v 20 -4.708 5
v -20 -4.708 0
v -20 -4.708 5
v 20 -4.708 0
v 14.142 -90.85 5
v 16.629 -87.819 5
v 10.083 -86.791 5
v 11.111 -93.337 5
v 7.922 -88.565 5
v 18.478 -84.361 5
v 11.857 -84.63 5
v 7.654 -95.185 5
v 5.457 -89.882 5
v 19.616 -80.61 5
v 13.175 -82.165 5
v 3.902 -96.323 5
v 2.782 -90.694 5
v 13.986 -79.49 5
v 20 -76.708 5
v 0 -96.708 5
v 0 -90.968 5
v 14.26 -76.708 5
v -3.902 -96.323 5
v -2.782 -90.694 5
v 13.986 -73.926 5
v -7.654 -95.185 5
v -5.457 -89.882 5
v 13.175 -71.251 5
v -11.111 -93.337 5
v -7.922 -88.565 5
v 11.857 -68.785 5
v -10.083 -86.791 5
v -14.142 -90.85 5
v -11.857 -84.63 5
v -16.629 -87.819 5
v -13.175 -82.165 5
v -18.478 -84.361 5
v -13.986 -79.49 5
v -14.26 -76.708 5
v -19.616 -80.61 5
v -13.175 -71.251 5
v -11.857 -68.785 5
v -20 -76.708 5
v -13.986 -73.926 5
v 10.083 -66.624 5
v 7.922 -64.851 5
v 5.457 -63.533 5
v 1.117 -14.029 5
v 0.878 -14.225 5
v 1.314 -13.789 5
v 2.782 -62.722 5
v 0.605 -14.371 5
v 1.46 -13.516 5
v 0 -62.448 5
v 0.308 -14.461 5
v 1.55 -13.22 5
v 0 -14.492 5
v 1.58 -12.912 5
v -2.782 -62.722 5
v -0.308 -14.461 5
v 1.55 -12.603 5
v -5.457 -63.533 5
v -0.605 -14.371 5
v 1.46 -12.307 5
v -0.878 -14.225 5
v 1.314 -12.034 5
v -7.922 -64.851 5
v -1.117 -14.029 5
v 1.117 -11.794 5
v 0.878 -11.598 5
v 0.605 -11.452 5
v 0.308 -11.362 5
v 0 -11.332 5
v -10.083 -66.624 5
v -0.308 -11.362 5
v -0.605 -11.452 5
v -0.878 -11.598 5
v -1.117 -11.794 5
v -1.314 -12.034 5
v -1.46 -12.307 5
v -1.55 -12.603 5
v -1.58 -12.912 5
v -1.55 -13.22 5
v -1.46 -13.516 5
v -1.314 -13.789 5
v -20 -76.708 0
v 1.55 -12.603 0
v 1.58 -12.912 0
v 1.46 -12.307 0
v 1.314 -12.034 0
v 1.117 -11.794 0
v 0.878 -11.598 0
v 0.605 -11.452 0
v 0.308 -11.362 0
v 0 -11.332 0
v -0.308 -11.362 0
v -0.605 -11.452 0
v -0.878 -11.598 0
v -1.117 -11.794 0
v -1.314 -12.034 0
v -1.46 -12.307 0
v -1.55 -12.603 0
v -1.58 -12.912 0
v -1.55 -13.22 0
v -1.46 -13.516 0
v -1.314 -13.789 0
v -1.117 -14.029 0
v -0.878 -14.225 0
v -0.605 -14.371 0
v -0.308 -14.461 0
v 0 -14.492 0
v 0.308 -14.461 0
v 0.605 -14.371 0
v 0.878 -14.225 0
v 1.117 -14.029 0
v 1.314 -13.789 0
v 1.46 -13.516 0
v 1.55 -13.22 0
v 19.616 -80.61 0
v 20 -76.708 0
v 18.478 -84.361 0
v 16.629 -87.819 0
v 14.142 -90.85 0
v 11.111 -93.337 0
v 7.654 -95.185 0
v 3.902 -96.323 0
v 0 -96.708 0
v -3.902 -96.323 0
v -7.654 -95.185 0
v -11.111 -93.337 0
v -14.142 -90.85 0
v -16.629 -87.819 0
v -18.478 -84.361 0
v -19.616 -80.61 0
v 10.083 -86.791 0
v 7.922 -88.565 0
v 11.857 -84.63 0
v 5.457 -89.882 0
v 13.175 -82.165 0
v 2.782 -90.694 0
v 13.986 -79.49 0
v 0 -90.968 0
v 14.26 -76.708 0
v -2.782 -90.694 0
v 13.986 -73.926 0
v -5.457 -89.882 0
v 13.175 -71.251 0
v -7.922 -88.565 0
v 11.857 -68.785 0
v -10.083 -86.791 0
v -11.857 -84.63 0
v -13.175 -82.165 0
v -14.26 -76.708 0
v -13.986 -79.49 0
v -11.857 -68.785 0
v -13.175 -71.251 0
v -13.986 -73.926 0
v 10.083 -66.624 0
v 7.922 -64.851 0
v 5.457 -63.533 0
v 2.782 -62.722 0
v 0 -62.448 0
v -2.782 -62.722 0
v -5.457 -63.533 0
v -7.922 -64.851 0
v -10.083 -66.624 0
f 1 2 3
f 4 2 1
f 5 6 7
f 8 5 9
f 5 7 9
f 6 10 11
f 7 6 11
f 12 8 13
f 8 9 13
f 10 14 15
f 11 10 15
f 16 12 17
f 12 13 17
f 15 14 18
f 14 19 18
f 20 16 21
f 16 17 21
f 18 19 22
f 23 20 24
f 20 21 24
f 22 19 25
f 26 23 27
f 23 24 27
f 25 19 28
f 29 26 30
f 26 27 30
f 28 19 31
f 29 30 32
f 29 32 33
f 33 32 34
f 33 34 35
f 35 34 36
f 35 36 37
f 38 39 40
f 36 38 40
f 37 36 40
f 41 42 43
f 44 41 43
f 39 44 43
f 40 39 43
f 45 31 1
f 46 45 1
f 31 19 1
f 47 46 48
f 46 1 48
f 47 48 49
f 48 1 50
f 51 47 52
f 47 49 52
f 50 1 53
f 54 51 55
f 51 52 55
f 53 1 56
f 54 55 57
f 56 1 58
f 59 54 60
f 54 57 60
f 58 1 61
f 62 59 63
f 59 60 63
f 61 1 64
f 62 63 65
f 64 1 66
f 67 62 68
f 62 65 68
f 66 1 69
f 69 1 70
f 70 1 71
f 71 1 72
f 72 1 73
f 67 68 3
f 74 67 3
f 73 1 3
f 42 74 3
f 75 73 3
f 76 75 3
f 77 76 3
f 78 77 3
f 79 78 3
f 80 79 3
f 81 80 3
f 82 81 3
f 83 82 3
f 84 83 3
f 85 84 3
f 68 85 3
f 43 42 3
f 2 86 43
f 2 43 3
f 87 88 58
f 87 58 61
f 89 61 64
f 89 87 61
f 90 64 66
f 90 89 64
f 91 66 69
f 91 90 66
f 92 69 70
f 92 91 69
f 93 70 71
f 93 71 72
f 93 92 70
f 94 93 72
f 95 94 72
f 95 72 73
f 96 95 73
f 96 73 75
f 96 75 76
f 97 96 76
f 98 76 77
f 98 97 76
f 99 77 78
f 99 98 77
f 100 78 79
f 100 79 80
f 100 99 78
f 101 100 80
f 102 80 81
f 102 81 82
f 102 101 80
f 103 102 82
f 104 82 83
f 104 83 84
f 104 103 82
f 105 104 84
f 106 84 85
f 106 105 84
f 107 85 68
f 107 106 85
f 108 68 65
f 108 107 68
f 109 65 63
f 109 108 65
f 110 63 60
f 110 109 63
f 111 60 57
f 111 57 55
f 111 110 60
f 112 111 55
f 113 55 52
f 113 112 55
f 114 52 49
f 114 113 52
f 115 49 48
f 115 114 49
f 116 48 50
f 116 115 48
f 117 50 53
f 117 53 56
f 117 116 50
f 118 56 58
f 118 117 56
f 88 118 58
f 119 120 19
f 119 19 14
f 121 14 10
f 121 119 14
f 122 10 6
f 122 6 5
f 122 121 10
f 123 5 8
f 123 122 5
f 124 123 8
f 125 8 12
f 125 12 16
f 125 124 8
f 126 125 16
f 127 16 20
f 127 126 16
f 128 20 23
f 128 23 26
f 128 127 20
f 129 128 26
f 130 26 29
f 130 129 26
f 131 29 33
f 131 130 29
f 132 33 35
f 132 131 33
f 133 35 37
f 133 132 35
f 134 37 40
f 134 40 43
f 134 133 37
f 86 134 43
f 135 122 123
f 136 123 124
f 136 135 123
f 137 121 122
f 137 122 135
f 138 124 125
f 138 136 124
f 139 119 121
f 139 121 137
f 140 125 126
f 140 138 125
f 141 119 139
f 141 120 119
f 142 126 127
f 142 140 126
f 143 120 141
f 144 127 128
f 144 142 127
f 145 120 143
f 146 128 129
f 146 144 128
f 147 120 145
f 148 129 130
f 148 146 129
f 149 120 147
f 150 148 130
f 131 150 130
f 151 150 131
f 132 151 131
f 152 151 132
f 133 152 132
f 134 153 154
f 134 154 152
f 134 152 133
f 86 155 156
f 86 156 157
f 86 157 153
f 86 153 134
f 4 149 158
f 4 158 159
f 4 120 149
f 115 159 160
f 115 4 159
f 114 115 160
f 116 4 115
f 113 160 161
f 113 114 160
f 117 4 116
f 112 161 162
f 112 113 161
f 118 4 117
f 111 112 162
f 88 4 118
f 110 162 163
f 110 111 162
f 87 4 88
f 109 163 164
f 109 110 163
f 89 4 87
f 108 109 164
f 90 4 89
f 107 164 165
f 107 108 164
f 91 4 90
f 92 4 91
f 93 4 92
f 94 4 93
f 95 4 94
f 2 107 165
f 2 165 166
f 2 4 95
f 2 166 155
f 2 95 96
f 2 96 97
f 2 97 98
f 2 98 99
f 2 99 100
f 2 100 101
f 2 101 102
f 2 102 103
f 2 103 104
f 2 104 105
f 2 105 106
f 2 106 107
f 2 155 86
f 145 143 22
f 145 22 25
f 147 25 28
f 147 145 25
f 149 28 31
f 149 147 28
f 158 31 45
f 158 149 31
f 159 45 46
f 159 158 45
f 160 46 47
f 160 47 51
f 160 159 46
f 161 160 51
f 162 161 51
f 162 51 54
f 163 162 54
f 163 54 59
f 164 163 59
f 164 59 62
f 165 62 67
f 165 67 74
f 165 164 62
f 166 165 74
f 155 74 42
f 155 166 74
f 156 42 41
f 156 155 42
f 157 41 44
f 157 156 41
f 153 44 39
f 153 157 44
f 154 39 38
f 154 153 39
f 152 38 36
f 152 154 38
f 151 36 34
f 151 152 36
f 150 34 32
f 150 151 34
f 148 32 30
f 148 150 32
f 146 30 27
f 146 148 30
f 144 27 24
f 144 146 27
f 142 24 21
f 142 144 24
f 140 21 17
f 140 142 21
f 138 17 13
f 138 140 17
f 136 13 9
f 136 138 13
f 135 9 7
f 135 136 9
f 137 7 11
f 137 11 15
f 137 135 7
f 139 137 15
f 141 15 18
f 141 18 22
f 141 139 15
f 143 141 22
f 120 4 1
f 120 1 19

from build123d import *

# Parameters (mm, degrees)
SKETCH1_R           = 1.58
SKETCH1_R_2         = 14.26
BOSS_EXTRUDE1_DEPTH = 5


with BuildPart() as part:
    # Sketch1 → Boss-Extrude1 (new body)
    with BuildSketch(Plane.XY):
        with BuildLine():
            Line((-20, -76.707766284), (-20, -58.504148974))
            Line((-20, -58.504148974), (-20, -4.707766284))
            Line((-20, -4.707766284), (20, -4.707766284))
            Line((20, -4.707766284), (20, -76.707766284))
            ThreePointArc((20, -76.707766284), (0, -96.707766284), (-20, -76.707766284))
        make_face()
        with Locations((0, -12.911655735)):
            Circle(SKETCH1_R, mode=Mode.SUBTRACT)
        with Locations((0, -76.707766284)):
            Circle(SKETCH1_R_2, mode=Mode.SUBTRACT)
    extrude(amount=BOSS_EXTRUDE1_DEPTH)


solid = part.part
